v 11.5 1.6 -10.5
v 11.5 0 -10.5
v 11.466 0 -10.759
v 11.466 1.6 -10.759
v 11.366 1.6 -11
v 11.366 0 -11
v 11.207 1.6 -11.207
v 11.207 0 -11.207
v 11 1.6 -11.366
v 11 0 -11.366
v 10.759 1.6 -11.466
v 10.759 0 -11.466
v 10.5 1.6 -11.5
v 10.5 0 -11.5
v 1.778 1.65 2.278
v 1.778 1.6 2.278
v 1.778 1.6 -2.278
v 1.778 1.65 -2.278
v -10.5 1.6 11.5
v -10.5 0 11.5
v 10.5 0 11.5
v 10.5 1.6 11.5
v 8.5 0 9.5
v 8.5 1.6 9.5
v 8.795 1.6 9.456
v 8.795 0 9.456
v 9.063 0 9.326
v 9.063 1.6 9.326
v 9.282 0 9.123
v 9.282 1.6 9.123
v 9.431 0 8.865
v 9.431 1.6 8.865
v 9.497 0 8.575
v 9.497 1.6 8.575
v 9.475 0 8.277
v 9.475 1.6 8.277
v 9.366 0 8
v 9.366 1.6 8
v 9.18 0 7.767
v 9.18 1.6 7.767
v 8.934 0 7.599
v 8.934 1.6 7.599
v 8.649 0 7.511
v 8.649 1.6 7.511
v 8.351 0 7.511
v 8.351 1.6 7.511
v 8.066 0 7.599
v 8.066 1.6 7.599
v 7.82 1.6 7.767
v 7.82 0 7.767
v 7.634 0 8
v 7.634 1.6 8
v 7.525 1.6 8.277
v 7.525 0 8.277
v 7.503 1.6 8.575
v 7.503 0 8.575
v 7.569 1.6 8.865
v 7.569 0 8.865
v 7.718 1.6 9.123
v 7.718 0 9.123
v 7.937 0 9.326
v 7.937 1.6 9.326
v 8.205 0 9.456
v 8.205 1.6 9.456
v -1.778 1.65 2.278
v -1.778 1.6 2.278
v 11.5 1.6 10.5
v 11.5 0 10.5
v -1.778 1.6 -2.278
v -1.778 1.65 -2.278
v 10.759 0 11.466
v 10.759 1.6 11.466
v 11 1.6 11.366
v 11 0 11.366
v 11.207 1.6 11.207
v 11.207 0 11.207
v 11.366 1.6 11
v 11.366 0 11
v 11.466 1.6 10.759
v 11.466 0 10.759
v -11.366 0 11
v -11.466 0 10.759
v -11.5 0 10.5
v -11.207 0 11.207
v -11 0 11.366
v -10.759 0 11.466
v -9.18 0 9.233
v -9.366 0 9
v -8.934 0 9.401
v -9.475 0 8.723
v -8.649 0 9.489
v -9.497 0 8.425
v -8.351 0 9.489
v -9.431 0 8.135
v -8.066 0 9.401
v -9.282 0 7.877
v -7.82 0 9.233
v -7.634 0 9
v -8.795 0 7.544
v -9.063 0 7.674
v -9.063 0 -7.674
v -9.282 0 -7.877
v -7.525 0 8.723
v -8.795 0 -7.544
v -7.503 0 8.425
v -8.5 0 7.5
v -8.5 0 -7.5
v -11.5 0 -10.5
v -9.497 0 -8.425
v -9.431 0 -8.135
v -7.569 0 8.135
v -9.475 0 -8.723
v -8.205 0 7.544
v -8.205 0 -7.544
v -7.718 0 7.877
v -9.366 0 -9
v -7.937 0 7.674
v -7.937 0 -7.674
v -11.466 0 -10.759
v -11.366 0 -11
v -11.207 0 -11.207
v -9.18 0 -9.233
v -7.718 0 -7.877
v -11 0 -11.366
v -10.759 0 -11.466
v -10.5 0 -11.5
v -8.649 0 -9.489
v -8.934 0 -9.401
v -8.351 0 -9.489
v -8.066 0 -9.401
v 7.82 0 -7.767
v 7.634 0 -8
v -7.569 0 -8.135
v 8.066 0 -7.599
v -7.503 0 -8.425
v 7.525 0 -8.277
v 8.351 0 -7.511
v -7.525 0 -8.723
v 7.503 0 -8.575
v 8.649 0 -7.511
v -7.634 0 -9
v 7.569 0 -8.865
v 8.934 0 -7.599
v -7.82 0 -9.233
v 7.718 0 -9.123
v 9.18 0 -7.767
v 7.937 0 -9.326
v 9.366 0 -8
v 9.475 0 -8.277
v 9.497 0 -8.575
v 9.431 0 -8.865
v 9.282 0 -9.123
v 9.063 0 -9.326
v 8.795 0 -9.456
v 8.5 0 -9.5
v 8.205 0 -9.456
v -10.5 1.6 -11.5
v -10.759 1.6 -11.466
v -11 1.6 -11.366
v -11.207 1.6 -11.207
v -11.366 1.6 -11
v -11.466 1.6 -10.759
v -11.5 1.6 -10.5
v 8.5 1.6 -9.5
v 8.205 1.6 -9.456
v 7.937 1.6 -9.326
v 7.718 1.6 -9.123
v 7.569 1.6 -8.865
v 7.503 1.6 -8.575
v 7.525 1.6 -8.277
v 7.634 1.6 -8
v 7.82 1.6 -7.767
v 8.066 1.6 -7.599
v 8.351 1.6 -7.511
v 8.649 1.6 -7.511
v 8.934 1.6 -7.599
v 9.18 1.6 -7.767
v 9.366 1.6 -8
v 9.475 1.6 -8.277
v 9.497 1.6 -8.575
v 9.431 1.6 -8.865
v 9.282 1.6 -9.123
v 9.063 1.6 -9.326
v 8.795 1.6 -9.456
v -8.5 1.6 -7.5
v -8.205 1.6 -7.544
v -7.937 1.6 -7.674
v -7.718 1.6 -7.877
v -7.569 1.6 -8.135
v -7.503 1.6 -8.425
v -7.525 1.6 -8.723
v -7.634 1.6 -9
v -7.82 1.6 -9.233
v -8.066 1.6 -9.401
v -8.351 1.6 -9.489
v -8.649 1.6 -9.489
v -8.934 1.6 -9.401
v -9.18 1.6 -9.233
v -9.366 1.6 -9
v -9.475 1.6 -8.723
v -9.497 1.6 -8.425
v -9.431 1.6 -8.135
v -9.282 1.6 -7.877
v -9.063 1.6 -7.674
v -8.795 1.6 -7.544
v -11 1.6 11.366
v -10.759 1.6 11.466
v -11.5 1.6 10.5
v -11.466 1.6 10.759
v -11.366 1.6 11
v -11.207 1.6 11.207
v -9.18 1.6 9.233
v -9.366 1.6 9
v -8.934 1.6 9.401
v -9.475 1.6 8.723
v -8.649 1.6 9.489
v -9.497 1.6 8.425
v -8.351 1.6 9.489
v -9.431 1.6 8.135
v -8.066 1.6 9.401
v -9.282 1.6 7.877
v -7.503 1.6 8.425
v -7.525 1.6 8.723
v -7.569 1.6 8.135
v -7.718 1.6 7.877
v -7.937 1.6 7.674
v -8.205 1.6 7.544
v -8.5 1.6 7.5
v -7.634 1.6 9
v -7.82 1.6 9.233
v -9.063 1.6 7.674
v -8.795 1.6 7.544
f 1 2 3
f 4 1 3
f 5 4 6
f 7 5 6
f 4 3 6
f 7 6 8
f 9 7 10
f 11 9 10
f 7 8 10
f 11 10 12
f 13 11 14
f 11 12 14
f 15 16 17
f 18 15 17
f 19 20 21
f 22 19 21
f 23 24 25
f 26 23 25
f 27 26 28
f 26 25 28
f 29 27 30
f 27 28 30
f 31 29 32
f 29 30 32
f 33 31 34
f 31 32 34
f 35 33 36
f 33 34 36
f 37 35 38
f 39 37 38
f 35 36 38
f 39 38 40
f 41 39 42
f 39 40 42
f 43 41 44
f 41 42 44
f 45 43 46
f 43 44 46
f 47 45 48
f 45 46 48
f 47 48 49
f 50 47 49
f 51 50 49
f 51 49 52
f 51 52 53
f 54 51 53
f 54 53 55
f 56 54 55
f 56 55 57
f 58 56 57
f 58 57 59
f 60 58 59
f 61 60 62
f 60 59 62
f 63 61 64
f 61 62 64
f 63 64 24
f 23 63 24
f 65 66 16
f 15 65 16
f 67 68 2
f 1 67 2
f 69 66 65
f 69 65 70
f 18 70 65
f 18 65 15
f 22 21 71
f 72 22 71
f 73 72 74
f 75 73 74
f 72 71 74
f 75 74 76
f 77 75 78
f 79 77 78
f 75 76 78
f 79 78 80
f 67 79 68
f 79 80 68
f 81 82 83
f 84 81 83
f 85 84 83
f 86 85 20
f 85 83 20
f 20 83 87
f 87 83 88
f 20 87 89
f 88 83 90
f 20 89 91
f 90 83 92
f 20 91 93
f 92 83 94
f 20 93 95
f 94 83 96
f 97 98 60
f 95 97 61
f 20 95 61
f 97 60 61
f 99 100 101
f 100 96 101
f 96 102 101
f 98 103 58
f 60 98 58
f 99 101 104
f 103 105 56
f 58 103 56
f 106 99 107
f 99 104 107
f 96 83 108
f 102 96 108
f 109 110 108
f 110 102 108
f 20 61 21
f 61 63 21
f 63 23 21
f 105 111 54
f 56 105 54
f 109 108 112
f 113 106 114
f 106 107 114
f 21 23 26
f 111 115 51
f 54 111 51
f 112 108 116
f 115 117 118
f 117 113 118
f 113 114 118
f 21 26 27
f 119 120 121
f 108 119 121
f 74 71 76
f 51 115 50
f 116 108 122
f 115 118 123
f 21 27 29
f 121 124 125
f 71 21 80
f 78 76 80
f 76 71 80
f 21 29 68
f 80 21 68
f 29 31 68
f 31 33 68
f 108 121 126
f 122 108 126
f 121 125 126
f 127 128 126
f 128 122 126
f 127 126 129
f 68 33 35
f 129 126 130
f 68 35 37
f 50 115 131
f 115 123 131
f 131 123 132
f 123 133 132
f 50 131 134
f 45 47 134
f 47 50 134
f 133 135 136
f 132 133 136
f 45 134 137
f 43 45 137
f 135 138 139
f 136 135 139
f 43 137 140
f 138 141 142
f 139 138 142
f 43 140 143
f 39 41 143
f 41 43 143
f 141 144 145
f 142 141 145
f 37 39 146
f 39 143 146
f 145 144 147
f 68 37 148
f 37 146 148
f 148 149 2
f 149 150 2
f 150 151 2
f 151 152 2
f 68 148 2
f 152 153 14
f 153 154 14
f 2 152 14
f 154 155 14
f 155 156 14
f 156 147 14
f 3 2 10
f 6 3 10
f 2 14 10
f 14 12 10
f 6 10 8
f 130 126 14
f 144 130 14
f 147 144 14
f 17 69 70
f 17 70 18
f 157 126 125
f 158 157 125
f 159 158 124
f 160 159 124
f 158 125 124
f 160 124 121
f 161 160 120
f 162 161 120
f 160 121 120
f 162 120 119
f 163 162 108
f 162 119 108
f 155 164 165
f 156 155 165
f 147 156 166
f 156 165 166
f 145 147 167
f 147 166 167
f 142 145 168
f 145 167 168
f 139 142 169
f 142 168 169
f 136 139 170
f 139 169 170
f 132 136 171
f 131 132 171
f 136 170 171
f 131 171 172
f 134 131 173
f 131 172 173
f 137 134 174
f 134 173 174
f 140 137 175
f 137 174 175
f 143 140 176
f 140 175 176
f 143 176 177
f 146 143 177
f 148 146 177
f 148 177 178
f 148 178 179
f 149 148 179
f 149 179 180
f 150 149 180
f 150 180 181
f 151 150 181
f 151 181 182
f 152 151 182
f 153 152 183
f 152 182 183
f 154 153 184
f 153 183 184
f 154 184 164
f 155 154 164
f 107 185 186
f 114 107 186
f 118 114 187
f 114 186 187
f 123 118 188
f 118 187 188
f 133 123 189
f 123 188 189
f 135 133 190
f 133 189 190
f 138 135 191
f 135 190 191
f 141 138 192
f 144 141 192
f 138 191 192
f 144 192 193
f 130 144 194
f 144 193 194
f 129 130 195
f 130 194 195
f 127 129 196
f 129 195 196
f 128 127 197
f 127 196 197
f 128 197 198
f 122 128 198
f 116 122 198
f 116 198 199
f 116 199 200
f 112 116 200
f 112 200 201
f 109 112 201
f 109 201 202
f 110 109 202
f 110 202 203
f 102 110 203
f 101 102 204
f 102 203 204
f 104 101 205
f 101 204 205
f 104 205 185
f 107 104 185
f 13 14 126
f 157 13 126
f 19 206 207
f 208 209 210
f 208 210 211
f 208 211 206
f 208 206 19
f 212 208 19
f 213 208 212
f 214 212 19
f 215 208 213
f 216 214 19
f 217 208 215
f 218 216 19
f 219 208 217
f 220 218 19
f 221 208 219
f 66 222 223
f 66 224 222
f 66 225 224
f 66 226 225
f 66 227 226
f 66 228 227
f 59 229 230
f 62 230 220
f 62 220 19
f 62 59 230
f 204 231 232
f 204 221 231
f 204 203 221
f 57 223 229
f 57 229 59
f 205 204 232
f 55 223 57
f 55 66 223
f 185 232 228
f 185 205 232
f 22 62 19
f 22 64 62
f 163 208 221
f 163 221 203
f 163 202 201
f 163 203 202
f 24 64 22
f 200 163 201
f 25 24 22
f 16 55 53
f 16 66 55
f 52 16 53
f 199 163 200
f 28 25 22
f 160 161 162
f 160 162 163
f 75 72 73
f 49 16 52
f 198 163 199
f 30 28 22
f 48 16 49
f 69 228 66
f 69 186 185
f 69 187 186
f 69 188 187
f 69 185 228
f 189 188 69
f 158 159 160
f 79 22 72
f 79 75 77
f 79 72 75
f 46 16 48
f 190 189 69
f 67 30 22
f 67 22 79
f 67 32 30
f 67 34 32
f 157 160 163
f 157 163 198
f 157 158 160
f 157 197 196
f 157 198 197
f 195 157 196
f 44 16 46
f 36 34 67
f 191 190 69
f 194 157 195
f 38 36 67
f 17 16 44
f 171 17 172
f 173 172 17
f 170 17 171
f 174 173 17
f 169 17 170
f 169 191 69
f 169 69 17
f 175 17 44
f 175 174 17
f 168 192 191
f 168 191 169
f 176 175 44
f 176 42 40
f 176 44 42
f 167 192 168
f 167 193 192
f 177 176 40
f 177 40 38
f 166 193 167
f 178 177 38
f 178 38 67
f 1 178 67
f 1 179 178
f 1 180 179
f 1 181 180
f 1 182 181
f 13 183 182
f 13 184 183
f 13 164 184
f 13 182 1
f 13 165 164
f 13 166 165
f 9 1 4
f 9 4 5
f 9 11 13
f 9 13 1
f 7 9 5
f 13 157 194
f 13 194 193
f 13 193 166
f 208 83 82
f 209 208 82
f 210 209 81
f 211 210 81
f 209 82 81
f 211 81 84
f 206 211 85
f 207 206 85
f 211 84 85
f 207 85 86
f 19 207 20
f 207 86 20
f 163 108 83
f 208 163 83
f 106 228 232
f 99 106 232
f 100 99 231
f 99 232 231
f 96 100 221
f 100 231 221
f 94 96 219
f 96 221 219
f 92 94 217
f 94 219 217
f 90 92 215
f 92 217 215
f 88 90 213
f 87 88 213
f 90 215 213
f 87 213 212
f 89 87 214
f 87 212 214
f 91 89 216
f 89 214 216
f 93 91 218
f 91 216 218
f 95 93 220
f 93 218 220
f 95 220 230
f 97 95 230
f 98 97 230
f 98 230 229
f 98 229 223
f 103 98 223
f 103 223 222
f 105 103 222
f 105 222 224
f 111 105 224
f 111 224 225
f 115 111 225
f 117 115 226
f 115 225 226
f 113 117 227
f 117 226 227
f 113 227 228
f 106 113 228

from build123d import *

# Parameters (mm, degrees)
BOSS_EXTRUDE1_DEPTH = 1.6
SKETCH2_R           = 1
CUT_EXTRUDE1_DEPTH  = 1.6
SKETCH4_W           = 3.557
SKETCH4_H           = 4.557
BOSS_EXTRUDE2_DEPTH = 0.05


with BuildPart() as part:
    # Sketch1 → Boss-Extrude1 (new body)
    with BuildSketch(Plane(origin=(0, 0, 0), x_dir=(1, 0, 0), z_dir=(0, 1, 0))):
        with BuildLine():
            Line((-10.5, -11.5), (10.5, -11.5))
            ThreePointArc((10.5, -11.5), (11.207106781, -11.207106781), (11.5, -10.5))
            Line((11.5, -10.5), (11.5, 10.5))
            ThreePointArc((11.5, 10.5), (11.207106781, 11.207106781), (10.5, 11.5))
            Line((10.5, 11.5), (-10.5, 11.5))
            ThreePointArc((-10.5, 11.5), (-11.207106781, 11.207106781), (-11.5, 10.5))
            Line((-11.5, 10.5), (-11.5, -10.5))
            ThreePointArc((-11.5, -10.5), (-11.207106781, -11.207106781), (-10.5, -11.5))
        make_face()
    extrude(amount=BOSS_EXTRUDE1_DEPTH)

    # Sketch2 → Cut-Extrude1 (cut)
    with BuildSketch(Plane(origin=(0, 1.6, 0), x_dir=(1, 0, 0), z_dir=(0, 1, 0))):
        with Locations(Location((-8.5, 8.5, 0), (0, 0, 270))):
            Circle(SKETCH2_R)
        with Locations(Location((-8.5, -8.5, 0), (0, 0, 90))):
            Circle(SKETCH2_R)
        with Locations(Location((8.5, 8.5, 0), (0, 0, 90))):
            Circle(SKETCH2_R)
        with Locations(Location((8.5, -8.5, 0), (0, 0, 270))):
            Circle(SKETCH2_R)
    extrude(amount=-CUT_EXTRUDE1_DEPTH, mode=Mode.SUBTRACT)

    # Sketch4 → Boss-Extrude2 (add)
    with BuildSketch(Plane(origin=(0, 1.6, 0), x_dir=(1, 0, 0), z_dir=(0, 1, 0))):
        Rectangle(SKETCH4_W, SKETCH4_H)
    extrude(amount=BOSS_EXTRUDE2_DEPTH)


solid = part.part
